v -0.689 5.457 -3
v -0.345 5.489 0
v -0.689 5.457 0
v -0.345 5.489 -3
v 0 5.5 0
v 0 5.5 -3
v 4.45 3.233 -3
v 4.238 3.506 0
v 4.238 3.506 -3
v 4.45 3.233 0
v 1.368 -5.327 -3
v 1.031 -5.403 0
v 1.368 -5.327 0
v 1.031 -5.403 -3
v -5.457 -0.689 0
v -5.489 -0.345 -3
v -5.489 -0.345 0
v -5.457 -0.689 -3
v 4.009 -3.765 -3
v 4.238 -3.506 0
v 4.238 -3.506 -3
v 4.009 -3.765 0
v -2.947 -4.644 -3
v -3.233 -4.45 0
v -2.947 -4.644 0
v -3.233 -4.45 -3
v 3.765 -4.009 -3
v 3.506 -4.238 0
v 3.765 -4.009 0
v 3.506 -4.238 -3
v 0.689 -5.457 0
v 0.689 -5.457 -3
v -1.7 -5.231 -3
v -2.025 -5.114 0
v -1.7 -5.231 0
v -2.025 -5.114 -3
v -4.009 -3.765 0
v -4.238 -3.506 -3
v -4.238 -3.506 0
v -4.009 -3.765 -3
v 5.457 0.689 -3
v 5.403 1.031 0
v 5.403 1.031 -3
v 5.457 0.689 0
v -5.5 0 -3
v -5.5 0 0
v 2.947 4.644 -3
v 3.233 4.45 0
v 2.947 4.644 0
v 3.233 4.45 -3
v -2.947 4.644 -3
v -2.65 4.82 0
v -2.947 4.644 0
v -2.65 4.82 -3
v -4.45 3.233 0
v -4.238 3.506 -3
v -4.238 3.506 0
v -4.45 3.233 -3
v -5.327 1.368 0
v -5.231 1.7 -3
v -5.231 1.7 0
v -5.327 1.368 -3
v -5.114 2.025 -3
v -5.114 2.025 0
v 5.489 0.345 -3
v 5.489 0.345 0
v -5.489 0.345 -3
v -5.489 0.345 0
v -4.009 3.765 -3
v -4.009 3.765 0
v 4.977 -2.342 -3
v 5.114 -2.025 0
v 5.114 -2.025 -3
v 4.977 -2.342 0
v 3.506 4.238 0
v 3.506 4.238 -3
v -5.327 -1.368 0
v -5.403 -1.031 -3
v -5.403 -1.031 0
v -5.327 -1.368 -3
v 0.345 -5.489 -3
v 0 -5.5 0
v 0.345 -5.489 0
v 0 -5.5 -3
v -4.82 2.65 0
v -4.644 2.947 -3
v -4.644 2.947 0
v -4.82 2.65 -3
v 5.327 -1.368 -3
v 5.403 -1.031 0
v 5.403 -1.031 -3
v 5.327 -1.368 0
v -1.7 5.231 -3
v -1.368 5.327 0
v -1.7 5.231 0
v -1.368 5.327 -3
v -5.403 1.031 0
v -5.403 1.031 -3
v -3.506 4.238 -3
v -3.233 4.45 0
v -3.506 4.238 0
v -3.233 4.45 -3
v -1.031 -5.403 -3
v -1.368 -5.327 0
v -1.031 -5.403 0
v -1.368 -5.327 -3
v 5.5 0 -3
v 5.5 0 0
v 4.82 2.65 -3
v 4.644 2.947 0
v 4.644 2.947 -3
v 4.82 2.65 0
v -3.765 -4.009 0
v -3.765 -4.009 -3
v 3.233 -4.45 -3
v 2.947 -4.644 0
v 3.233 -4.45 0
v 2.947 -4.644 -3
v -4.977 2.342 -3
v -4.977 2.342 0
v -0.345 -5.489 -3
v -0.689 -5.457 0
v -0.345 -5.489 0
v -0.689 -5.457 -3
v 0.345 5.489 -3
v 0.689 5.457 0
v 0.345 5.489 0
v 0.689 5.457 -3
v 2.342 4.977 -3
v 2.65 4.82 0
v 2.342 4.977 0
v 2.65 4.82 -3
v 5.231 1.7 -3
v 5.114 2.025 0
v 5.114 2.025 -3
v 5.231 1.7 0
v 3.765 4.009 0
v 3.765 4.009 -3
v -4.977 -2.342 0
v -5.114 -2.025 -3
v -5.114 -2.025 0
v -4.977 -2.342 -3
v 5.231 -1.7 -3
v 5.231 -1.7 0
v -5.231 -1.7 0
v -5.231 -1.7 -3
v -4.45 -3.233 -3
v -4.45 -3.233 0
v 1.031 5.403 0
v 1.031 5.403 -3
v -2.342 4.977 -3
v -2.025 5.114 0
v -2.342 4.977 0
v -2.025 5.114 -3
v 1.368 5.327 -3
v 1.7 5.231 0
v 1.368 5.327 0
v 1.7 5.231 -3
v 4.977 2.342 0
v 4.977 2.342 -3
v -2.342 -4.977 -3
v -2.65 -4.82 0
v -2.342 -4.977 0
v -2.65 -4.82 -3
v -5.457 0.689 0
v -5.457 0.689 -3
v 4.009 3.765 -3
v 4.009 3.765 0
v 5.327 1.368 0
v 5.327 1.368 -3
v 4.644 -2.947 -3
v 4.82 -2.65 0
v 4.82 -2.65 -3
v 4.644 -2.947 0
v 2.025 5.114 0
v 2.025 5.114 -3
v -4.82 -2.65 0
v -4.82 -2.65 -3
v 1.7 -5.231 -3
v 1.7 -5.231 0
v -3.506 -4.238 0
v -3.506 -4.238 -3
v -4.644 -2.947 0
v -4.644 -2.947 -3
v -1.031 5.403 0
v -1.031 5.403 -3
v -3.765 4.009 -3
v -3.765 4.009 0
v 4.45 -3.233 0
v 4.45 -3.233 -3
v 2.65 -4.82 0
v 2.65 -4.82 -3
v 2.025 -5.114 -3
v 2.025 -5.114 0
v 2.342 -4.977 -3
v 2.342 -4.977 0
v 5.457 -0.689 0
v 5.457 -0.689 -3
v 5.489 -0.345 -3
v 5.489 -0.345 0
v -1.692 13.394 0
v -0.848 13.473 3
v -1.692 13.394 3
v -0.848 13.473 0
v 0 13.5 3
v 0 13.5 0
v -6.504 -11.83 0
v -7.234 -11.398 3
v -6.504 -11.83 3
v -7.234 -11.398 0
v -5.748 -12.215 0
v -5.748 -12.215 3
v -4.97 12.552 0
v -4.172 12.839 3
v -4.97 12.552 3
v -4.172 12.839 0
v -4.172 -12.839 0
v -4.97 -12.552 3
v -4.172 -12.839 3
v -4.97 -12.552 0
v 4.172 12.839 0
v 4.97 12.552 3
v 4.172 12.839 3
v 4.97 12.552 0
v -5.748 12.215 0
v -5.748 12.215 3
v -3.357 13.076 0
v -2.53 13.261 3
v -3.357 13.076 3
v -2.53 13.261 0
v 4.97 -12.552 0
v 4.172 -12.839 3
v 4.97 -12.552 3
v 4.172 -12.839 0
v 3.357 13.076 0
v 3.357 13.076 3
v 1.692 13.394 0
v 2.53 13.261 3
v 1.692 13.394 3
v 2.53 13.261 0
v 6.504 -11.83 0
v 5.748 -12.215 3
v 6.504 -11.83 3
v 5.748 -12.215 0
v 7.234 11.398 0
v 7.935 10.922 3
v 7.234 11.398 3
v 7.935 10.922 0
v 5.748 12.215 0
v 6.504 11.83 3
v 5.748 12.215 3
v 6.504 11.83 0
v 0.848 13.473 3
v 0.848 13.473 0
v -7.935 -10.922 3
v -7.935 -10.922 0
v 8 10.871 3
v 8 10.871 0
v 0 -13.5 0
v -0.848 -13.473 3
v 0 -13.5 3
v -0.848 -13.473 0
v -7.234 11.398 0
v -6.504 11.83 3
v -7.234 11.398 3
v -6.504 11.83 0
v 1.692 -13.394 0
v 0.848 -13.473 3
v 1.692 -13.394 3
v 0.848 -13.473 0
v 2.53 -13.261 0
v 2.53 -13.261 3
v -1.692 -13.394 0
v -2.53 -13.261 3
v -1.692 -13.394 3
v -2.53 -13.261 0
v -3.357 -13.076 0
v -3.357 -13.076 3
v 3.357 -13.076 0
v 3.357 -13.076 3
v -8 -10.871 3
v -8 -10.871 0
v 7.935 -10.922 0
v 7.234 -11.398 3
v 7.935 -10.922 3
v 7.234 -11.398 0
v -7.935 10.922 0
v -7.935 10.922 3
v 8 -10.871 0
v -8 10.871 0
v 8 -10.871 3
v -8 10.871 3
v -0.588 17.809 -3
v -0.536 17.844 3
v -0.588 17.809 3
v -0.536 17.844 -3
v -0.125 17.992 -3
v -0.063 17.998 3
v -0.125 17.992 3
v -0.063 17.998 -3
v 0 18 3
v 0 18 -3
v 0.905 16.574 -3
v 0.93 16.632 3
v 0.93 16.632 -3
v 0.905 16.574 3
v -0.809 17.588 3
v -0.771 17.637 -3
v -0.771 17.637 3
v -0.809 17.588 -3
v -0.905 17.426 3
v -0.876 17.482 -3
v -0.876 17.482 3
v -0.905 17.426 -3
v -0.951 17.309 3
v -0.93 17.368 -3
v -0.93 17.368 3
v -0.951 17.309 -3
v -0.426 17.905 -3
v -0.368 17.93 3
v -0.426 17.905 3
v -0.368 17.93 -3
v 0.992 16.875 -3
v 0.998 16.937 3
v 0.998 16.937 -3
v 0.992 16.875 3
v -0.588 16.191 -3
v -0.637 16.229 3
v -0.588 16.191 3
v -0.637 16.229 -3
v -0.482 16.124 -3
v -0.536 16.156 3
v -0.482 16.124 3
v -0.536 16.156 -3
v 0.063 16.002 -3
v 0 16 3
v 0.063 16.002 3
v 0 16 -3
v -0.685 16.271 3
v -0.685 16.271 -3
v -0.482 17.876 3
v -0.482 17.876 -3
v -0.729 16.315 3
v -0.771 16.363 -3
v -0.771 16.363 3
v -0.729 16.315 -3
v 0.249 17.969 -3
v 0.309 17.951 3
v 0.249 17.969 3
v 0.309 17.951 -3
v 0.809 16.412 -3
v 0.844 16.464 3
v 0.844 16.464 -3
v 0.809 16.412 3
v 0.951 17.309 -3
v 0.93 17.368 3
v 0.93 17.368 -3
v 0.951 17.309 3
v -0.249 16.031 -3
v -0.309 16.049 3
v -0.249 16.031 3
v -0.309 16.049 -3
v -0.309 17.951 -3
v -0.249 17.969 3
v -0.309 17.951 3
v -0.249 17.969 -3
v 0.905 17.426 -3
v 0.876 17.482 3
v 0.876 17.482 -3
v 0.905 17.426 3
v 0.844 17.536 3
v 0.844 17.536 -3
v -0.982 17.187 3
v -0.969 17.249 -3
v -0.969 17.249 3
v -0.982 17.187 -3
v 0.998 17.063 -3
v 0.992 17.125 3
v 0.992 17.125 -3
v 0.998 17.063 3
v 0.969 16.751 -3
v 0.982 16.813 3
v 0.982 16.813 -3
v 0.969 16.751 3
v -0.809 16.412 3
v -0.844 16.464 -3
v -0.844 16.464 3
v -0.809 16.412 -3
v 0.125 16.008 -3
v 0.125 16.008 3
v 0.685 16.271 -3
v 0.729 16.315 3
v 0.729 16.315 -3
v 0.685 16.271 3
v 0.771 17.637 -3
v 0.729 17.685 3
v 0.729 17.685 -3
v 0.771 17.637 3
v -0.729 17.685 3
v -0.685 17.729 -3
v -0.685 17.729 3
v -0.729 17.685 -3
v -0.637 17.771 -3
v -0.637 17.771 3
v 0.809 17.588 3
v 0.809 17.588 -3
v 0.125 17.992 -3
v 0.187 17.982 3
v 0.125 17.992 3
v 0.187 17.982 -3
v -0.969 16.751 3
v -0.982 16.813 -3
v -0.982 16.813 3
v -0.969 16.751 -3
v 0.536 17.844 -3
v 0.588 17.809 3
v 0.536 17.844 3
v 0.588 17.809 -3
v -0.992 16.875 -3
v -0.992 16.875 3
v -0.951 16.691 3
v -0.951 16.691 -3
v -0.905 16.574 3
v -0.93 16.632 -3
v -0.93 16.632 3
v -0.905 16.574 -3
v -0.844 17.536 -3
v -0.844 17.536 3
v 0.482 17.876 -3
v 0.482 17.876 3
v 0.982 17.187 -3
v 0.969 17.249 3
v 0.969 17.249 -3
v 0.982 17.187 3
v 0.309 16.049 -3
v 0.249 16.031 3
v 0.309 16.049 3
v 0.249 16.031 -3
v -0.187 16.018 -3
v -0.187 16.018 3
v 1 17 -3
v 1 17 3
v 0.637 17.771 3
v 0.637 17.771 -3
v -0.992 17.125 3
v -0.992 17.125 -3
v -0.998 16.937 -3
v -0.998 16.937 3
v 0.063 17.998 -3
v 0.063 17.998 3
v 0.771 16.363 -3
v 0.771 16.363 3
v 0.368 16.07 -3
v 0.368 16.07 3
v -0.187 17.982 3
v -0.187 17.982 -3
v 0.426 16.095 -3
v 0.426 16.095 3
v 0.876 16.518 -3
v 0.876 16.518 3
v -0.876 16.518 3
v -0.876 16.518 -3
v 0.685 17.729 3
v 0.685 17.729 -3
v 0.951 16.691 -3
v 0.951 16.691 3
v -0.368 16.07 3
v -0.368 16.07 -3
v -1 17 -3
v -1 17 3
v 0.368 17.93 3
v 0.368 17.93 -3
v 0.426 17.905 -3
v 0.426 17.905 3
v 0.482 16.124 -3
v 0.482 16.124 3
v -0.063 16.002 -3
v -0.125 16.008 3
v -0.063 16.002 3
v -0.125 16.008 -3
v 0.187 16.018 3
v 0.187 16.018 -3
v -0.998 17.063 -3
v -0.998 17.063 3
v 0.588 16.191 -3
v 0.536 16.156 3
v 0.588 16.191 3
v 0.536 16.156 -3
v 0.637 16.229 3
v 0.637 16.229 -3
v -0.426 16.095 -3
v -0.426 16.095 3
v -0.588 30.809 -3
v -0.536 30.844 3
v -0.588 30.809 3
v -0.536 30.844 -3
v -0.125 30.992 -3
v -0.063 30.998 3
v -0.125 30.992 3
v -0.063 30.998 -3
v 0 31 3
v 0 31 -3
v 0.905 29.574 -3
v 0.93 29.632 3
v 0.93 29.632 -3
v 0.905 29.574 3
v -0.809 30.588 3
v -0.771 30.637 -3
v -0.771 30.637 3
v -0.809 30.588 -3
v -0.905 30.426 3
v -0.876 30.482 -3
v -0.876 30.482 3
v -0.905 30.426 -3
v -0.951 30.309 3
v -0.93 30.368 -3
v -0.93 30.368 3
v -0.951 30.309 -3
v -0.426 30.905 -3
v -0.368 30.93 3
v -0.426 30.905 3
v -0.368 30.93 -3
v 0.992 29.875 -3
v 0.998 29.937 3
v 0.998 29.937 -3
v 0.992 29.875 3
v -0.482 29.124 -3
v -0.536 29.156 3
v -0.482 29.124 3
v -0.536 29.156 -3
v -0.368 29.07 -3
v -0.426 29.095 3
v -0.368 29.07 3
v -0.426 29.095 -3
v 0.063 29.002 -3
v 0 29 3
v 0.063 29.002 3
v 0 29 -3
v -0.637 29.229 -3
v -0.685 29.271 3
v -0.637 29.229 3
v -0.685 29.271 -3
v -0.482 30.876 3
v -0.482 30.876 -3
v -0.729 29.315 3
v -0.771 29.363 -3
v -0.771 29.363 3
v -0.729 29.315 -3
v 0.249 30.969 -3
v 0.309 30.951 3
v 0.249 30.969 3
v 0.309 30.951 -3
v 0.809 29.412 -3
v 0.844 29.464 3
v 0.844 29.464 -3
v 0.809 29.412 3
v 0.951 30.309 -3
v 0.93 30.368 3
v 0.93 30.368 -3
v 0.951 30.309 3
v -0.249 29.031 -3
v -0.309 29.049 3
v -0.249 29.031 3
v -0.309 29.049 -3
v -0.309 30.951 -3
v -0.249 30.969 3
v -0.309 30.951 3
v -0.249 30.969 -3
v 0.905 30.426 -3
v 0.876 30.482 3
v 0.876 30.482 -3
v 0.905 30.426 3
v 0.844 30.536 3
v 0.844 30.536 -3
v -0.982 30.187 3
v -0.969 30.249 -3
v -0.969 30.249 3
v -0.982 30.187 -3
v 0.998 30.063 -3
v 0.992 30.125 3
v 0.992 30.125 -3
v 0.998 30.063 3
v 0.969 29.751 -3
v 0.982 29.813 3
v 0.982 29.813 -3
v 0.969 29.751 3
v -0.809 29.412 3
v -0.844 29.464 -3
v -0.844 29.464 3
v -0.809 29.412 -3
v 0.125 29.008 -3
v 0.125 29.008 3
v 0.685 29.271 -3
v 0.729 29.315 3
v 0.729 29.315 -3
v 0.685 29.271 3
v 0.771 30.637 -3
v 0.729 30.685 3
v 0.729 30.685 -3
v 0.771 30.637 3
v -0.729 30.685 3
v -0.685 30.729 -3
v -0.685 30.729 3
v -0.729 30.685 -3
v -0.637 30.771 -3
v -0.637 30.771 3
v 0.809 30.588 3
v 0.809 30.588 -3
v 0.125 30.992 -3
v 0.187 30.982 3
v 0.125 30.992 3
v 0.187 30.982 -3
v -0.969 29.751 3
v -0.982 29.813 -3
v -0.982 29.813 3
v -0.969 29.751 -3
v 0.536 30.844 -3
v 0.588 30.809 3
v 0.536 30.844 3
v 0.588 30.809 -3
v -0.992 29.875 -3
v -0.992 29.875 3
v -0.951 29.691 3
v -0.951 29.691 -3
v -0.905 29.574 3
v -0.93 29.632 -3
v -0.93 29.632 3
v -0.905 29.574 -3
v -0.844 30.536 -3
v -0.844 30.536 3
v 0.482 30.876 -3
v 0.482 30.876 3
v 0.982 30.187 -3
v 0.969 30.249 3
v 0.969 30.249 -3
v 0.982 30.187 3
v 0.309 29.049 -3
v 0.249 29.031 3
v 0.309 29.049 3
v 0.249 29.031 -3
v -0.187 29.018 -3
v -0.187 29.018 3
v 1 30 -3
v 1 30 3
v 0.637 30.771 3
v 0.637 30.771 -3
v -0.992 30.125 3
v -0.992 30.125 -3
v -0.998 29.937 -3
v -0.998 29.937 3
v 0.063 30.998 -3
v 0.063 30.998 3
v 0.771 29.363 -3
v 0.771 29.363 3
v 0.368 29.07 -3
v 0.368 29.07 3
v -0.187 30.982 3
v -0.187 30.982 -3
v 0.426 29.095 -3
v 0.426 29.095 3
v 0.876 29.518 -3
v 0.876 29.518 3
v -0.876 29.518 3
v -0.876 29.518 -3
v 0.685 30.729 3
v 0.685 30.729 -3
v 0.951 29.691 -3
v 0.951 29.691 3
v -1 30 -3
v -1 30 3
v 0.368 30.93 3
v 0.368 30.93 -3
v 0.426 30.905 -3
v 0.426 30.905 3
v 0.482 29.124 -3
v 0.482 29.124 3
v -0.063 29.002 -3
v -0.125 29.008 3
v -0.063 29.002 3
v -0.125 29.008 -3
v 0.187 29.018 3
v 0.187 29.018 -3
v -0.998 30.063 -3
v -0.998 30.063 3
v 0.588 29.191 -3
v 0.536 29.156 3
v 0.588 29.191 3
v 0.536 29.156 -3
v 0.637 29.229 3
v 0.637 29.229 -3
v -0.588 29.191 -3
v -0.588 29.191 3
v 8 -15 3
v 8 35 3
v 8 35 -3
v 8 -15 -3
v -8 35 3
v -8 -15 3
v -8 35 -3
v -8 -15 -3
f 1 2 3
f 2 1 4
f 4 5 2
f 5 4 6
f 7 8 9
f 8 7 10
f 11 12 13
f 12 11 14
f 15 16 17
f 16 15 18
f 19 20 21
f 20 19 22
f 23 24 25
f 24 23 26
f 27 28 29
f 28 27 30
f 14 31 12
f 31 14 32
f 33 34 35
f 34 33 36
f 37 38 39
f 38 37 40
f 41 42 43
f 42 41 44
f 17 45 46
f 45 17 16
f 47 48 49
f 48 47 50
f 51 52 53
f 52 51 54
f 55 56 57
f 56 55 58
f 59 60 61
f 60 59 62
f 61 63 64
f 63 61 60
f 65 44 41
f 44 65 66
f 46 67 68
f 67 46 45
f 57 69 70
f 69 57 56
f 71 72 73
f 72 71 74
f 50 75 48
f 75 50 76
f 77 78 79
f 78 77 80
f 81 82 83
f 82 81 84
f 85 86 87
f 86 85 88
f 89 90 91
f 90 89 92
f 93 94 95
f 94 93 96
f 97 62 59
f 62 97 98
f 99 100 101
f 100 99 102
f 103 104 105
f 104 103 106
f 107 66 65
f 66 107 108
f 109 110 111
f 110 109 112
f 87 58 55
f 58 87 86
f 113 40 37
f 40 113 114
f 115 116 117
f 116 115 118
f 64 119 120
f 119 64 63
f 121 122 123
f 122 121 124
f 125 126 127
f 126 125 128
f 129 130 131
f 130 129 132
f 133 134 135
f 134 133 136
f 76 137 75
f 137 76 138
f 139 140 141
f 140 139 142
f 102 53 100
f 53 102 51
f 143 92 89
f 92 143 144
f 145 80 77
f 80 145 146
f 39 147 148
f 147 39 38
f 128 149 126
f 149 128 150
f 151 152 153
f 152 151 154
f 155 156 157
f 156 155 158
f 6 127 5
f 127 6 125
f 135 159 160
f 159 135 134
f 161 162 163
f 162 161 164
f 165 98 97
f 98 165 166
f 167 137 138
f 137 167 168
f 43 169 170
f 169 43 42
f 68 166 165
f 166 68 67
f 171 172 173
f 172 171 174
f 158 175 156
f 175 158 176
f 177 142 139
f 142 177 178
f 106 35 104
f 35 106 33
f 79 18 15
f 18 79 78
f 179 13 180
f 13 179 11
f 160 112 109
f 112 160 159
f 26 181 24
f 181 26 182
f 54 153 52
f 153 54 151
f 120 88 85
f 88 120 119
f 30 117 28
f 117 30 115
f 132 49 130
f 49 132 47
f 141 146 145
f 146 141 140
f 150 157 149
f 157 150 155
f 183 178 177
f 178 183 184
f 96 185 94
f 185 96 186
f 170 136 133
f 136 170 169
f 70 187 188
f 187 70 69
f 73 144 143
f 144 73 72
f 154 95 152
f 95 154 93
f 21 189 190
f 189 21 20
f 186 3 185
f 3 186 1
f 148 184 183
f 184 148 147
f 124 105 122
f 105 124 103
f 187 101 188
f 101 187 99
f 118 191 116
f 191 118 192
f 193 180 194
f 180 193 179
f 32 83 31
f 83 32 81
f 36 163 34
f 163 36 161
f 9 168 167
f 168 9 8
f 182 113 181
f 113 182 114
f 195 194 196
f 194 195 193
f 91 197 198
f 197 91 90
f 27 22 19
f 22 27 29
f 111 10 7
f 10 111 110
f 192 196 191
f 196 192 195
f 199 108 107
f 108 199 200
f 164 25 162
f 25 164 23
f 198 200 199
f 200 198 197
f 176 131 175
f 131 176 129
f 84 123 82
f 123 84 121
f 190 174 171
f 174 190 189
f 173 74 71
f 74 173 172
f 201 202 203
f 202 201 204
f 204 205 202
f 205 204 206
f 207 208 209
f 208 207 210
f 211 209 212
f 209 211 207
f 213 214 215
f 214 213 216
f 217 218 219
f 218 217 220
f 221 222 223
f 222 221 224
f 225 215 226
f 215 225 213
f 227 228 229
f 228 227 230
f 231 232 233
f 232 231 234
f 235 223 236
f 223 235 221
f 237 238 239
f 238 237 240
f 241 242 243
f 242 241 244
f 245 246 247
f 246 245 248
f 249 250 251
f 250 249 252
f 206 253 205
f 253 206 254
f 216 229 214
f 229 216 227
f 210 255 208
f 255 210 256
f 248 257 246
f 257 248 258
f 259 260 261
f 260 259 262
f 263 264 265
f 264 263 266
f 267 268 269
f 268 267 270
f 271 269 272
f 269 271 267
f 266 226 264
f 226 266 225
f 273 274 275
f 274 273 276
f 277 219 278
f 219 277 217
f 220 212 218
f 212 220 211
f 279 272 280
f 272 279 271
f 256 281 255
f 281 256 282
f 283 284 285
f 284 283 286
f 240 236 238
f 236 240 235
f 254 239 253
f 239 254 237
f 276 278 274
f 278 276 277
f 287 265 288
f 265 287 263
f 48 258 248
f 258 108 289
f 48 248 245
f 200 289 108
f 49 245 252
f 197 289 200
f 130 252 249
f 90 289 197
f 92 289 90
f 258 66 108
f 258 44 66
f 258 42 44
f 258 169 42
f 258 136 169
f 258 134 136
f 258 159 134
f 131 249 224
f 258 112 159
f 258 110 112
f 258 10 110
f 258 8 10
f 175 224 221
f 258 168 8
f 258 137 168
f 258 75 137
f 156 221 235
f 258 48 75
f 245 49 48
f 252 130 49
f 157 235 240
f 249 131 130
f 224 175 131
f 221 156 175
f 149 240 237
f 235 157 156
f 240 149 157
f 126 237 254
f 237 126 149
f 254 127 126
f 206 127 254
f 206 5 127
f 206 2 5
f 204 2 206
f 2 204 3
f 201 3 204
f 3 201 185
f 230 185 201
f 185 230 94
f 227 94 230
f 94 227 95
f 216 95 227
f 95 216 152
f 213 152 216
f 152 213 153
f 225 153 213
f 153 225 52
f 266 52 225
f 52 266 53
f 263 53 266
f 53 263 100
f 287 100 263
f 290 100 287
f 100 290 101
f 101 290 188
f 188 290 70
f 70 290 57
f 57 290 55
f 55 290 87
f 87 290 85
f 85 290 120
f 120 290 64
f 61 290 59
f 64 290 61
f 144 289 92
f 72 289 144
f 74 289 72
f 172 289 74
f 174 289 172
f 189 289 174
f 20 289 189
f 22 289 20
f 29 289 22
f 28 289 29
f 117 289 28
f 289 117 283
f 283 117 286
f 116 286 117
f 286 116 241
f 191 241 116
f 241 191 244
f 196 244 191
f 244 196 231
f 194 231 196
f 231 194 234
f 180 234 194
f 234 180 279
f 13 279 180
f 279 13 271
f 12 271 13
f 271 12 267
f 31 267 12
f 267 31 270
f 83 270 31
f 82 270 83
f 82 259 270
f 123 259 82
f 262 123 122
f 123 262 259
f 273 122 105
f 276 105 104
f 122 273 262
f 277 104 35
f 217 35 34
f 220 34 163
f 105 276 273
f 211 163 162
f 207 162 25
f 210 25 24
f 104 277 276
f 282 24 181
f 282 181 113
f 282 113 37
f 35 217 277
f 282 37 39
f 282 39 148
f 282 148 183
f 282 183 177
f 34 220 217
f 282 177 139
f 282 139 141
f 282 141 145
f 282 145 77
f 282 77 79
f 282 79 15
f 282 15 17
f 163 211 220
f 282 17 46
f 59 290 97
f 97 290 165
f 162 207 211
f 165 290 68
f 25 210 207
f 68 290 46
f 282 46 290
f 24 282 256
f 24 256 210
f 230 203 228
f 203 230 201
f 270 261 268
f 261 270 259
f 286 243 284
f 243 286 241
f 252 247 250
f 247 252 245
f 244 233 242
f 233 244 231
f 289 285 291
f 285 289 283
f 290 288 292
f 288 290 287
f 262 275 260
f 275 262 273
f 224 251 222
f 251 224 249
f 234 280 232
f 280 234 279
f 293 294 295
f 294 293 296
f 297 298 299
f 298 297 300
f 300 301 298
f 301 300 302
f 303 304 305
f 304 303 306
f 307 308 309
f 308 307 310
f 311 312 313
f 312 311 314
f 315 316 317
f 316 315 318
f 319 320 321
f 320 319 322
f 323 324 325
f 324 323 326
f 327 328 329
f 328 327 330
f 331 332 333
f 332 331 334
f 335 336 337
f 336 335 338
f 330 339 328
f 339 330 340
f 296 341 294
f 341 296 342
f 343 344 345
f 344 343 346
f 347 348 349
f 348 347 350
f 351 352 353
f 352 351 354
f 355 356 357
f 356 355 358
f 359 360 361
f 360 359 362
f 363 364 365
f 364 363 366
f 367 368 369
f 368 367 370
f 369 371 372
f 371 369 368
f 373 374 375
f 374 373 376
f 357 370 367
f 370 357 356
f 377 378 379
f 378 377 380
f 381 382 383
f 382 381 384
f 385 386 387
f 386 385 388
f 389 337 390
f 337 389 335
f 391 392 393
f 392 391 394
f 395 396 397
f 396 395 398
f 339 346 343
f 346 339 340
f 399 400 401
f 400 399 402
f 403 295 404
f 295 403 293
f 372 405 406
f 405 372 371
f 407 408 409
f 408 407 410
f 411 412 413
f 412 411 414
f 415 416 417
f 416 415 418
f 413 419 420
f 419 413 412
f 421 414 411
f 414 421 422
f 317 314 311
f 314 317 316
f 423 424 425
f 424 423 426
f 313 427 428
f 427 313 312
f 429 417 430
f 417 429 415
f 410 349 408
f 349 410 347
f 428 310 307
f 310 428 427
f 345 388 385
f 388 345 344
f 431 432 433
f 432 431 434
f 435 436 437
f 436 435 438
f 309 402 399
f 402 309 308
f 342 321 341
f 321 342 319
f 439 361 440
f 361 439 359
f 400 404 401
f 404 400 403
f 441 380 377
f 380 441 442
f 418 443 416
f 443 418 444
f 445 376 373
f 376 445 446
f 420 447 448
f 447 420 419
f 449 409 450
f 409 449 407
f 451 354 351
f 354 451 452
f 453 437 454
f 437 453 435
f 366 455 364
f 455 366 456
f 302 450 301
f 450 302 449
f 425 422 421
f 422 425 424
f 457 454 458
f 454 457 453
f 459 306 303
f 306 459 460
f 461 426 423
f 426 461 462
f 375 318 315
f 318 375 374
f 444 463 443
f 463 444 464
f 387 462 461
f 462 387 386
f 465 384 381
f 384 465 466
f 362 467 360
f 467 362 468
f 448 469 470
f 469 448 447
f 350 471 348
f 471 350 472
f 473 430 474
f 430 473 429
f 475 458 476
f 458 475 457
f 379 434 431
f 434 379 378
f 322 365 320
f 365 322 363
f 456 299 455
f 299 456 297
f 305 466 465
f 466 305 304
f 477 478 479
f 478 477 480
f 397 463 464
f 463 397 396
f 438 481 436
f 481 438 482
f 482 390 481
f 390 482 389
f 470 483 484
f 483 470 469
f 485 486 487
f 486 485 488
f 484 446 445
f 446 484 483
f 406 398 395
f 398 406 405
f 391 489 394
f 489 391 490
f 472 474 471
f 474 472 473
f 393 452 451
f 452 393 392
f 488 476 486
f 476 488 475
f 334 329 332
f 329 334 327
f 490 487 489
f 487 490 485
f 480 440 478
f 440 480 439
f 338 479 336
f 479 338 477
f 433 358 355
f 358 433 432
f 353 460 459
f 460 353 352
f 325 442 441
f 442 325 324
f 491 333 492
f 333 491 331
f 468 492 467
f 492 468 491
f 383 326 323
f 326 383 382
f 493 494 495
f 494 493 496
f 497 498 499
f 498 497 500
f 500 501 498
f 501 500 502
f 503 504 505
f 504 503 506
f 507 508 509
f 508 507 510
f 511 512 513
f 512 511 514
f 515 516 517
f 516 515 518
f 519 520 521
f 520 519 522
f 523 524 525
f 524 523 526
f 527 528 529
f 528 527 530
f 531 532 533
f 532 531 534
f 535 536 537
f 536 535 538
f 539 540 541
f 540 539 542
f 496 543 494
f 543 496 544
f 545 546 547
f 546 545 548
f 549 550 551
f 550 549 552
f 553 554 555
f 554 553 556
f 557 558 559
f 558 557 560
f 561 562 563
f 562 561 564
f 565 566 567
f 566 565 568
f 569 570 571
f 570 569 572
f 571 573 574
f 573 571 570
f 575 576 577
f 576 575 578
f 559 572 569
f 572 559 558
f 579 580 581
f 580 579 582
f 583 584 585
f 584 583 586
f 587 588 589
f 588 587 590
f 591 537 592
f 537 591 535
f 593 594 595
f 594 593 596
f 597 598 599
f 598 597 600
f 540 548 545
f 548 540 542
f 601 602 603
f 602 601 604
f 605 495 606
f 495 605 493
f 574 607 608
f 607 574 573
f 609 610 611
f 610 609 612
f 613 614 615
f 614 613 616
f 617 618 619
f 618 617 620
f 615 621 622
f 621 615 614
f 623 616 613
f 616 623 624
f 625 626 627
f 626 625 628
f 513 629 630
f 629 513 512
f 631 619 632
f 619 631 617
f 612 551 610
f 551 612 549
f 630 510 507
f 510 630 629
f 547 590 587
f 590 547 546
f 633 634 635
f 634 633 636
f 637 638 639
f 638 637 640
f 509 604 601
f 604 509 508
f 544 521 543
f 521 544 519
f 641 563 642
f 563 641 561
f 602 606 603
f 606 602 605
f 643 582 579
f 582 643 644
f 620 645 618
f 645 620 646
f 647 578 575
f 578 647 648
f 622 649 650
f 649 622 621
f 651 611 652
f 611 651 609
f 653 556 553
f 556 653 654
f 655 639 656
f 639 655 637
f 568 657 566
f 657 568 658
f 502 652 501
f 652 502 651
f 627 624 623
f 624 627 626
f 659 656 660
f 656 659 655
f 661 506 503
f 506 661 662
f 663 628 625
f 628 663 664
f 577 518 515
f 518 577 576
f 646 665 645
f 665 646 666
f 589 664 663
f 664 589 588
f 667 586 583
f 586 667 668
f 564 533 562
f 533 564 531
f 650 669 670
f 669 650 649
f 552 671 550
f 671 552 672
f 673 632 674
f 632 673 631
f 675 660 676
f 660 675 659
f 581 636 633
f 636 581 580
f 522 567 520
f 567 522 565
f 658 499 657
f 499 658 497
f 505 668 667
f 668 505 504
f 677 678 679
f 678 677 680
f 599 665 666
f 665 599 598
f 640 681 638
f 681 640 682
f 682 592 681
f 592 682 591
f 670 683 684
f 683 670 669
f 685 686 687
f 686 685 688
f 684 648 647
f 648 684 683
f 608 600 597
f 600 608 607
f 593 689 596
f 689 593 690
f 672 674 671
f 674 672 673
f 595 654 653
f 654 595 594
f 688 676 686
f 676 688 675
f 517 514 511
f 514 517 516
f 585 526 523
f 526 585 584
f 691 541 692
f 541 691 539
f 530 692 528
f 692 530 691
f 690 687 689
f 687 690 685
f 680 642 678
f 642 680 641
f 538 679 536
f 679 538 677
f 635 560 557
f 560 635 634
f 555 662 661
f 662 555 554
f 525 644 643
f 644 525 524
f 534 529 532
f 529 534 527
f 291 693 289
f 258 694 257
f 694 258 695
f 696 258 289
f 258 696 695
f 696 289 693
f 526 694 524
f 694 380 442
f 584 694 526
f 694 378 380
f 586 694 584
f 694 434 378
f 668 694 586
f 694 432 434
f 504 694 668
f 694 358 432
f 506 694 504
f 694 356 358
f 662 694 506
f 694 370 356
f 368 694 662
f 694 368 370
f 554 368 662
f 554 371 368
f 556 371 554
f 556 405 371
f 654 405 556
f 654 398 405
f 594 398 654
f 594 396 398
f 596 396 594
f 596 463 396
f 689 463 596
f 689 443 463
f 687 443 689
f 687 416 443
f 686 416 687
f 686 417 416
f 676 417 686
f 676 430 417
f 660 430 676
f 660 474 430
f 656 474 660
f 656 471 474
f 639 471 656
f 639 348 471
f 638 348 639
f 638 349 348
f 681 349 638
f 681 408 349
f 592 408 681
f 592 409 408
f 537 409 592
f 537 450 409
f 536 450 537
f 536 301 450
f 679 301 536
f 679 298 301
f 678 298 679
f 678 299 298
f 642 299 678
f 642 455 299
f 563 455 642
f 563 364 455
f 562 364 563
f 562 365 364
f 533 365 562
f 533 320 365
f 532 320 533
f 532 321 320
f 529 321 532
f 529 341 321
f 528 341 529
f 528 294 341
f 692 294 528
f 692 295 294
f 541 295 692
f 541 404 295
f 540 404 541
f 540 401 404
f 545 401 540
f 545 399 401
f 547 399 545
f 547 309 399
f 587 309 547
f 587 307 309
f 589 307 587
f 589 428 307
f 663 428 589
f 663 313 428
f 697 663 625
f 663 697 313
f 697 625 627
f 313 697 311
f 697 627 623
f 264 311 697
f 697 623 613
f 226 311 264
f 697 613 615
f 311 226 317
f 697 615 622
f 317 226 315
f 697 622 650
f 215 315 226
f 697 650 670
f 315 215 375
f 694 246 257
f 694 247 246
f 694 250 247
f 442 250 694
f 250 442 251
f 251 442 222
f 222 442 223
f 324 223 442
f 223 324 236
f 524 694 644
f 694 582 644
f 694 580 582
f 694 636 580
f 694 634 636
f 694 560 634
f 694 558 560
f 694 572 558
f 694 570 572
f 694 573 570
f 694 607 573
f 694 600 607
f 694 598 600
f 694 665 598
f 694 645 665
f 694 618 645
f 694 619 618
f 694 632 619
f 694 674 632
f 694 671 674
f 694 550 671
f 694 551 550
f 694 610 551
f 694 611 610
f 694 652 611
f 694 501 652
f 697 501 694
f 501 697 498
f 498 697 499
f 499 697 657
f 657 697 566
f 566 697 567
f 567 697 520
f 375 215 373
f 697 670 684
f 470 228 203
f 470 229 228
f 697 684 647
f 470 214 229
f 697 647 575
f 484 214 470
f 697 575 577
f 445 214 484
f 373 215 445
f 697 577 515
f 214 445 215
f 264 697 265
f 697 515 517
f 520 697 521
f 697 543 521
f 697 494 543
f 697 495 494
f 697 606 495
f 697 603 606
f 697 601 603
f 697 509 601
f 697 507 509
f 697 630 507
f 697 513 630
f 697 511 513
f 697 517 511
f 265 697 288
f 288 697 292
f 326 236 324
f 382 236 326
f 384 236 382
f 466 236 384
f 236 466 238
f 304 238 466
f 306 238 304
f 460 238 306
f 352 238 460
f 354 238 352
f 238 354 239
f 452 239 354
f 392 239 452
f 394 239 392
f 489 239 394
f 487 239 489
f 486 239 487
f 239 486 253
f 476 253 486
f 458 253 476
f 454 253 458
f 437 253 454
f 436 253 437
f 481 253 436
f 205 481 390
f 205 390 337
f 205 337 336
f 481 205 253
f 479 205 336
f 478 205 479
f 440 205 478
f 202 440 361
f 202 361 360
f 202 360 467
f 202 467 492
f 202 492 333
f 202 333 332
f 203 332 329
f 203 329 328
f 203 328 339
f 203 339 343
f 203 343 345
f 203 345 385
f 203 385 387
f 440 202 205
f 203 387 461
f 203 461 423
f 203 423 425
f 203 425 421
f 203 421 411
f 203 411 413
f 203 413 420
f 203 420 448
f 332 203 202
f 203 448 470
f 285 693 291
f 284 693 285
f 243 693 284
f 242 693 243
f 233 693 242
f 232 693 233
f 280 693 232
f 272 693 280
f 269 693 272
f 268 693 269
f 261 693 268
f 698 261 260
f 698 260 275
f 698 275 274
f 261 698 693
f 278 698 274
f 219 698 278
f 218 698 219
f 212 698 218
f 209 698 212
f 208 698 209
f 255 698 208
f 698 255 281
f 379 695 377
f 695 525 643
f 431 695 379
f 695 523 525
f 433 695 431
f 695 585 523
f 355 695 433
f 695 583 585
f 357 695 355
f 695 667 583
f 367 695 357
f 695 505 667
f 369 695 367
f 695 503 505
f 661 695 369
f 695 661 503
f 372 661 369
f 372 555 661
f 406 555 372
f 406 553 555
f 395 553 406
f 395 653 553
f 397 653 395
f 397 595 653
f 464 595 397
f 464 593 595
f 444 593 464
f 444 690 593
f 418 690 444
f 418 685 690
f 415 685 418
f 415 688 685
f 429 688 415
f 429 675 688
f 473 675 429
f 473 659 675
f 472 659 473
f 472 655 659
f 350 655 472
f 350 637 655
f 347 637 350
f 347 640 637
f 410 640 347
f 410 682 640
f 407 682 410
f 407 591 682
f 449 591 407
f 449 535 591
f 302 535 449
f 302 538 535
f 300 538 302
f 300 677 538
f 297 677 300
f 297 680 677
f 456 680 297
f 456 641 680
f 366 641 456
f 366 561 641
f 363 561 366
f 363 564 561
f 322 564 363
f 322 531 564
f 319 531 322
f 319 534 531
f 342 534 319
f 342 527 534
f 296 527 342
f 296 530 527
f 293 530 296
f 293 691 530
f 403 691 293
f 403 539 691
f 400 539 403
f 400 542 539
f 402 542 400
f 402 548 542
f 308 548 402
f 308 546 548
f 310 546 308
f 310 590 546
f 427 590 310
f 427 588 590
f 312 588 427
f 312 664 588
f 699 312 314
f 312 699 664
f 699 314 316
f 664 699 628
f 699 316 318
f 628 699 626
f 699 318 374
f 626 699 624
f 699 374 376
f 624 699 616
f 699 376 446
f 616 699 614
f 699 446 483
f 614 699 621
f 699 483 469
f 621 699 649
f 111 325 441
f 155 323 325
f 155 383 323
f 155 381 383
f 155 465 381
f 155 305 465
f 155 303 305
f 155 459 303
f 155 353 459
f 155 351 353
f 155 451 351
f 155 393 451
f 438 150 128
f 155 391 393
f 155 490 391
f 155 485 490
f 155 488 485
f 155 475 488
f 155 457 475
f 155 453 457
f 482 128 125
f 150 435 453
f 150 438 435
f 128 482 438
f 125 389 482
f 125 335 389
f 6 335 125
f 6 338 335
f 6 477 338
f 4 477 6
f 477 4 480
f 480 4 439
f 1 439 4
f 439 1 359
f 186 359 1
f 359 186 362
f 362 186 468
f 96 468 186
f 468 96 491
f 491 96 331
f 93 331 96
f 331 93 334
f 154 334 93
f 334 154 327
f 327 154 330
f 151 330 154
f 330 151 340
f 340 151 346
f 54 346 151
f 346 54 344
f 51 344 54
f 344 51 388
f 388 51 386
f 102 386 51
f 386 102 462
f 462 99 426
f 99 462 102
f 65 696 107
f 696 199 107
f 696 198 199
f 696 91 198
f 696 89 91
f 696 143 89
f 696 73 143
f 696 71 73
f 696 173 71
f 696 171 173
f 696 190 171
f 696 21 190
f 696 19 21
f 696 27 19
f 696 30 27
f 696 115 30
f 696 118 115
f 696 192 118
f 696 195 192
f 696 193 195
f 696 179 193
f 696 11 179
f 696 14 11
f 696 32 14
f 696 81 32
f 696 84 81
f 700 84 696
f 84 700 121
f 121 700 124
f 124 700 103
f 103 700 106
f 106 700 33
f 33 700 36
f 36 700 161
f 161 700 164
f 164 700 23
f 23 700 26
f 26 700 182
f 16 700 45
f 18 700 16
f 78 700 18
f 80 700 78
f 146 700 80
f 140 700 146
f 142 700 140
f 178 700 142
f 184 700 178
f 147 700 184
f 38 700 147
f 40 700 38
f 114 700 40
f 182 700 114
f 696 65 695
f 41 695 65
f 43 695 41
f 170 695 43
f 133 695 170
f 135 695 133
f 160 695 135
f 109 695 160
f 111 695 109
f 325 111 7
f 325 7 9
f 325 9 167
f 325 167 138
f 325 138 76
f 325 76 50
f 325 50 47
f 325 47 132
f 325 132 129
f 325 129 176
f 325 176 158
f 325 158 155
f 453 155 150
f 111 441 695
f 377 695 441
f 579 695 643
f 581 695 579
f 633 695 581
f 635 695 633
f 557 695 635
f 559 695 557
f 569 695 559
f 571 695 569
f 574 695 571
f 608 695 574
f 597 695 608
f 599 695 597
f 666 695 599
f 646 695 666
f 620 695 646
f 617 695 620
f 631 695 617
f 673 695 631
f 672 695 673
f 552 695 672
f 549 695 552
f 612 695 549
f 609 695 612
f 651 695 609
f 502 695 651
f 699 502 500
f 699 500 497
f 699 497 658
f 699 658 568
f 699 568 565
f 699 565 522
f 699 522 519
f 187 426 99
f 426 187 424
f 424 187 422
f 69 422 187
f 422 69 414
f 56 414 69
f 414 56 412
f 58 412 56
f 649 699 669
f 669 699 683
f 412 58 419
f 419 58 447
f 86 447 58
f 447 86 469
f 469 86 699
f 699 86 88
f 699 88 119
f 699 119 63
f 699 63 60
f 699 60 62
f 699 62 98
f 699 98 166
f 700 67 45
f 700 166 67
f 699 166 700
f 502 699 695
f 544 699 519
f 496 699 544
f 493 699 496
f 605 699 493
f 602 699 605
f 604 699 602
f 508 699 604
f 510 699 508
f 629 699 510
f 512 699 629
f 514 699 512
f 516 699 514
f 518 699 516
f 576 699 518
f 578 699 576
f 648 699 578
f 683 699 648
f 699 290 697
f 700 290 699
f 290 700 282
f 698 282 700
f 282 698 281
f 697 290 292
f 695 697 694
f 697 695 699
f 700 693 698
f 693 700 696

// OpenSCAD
difference(){
	union(){
        
       translate([0,10,0]){
           cube([16,50,6], center=true);
       }
	}
	union() {
        
       translate([0,0,0]){
            rotate(a = [0,0,90]) {
              cylinder(h=600, r=5.5, $fn=100, center=true);
            }
       }			   
       translate([0,0,0]){
            rotate(a = [0,0,90]) {
              cylinder(h=600, r=13.5, $fn=100, center=false);
            }
       }			   
       translate([0,17,0]){
            rotate(a = [0,0,90]) {
              cylinder(h=600, r=1, $fn=100, center=true);
            }
       }			   
       translate([0,30,0]){
            rotate(a = [0,0,90]) {
              cylinder(h=600, r=1, $fn=100, center=true);
            }
       }			   
		   

        
	}
}
